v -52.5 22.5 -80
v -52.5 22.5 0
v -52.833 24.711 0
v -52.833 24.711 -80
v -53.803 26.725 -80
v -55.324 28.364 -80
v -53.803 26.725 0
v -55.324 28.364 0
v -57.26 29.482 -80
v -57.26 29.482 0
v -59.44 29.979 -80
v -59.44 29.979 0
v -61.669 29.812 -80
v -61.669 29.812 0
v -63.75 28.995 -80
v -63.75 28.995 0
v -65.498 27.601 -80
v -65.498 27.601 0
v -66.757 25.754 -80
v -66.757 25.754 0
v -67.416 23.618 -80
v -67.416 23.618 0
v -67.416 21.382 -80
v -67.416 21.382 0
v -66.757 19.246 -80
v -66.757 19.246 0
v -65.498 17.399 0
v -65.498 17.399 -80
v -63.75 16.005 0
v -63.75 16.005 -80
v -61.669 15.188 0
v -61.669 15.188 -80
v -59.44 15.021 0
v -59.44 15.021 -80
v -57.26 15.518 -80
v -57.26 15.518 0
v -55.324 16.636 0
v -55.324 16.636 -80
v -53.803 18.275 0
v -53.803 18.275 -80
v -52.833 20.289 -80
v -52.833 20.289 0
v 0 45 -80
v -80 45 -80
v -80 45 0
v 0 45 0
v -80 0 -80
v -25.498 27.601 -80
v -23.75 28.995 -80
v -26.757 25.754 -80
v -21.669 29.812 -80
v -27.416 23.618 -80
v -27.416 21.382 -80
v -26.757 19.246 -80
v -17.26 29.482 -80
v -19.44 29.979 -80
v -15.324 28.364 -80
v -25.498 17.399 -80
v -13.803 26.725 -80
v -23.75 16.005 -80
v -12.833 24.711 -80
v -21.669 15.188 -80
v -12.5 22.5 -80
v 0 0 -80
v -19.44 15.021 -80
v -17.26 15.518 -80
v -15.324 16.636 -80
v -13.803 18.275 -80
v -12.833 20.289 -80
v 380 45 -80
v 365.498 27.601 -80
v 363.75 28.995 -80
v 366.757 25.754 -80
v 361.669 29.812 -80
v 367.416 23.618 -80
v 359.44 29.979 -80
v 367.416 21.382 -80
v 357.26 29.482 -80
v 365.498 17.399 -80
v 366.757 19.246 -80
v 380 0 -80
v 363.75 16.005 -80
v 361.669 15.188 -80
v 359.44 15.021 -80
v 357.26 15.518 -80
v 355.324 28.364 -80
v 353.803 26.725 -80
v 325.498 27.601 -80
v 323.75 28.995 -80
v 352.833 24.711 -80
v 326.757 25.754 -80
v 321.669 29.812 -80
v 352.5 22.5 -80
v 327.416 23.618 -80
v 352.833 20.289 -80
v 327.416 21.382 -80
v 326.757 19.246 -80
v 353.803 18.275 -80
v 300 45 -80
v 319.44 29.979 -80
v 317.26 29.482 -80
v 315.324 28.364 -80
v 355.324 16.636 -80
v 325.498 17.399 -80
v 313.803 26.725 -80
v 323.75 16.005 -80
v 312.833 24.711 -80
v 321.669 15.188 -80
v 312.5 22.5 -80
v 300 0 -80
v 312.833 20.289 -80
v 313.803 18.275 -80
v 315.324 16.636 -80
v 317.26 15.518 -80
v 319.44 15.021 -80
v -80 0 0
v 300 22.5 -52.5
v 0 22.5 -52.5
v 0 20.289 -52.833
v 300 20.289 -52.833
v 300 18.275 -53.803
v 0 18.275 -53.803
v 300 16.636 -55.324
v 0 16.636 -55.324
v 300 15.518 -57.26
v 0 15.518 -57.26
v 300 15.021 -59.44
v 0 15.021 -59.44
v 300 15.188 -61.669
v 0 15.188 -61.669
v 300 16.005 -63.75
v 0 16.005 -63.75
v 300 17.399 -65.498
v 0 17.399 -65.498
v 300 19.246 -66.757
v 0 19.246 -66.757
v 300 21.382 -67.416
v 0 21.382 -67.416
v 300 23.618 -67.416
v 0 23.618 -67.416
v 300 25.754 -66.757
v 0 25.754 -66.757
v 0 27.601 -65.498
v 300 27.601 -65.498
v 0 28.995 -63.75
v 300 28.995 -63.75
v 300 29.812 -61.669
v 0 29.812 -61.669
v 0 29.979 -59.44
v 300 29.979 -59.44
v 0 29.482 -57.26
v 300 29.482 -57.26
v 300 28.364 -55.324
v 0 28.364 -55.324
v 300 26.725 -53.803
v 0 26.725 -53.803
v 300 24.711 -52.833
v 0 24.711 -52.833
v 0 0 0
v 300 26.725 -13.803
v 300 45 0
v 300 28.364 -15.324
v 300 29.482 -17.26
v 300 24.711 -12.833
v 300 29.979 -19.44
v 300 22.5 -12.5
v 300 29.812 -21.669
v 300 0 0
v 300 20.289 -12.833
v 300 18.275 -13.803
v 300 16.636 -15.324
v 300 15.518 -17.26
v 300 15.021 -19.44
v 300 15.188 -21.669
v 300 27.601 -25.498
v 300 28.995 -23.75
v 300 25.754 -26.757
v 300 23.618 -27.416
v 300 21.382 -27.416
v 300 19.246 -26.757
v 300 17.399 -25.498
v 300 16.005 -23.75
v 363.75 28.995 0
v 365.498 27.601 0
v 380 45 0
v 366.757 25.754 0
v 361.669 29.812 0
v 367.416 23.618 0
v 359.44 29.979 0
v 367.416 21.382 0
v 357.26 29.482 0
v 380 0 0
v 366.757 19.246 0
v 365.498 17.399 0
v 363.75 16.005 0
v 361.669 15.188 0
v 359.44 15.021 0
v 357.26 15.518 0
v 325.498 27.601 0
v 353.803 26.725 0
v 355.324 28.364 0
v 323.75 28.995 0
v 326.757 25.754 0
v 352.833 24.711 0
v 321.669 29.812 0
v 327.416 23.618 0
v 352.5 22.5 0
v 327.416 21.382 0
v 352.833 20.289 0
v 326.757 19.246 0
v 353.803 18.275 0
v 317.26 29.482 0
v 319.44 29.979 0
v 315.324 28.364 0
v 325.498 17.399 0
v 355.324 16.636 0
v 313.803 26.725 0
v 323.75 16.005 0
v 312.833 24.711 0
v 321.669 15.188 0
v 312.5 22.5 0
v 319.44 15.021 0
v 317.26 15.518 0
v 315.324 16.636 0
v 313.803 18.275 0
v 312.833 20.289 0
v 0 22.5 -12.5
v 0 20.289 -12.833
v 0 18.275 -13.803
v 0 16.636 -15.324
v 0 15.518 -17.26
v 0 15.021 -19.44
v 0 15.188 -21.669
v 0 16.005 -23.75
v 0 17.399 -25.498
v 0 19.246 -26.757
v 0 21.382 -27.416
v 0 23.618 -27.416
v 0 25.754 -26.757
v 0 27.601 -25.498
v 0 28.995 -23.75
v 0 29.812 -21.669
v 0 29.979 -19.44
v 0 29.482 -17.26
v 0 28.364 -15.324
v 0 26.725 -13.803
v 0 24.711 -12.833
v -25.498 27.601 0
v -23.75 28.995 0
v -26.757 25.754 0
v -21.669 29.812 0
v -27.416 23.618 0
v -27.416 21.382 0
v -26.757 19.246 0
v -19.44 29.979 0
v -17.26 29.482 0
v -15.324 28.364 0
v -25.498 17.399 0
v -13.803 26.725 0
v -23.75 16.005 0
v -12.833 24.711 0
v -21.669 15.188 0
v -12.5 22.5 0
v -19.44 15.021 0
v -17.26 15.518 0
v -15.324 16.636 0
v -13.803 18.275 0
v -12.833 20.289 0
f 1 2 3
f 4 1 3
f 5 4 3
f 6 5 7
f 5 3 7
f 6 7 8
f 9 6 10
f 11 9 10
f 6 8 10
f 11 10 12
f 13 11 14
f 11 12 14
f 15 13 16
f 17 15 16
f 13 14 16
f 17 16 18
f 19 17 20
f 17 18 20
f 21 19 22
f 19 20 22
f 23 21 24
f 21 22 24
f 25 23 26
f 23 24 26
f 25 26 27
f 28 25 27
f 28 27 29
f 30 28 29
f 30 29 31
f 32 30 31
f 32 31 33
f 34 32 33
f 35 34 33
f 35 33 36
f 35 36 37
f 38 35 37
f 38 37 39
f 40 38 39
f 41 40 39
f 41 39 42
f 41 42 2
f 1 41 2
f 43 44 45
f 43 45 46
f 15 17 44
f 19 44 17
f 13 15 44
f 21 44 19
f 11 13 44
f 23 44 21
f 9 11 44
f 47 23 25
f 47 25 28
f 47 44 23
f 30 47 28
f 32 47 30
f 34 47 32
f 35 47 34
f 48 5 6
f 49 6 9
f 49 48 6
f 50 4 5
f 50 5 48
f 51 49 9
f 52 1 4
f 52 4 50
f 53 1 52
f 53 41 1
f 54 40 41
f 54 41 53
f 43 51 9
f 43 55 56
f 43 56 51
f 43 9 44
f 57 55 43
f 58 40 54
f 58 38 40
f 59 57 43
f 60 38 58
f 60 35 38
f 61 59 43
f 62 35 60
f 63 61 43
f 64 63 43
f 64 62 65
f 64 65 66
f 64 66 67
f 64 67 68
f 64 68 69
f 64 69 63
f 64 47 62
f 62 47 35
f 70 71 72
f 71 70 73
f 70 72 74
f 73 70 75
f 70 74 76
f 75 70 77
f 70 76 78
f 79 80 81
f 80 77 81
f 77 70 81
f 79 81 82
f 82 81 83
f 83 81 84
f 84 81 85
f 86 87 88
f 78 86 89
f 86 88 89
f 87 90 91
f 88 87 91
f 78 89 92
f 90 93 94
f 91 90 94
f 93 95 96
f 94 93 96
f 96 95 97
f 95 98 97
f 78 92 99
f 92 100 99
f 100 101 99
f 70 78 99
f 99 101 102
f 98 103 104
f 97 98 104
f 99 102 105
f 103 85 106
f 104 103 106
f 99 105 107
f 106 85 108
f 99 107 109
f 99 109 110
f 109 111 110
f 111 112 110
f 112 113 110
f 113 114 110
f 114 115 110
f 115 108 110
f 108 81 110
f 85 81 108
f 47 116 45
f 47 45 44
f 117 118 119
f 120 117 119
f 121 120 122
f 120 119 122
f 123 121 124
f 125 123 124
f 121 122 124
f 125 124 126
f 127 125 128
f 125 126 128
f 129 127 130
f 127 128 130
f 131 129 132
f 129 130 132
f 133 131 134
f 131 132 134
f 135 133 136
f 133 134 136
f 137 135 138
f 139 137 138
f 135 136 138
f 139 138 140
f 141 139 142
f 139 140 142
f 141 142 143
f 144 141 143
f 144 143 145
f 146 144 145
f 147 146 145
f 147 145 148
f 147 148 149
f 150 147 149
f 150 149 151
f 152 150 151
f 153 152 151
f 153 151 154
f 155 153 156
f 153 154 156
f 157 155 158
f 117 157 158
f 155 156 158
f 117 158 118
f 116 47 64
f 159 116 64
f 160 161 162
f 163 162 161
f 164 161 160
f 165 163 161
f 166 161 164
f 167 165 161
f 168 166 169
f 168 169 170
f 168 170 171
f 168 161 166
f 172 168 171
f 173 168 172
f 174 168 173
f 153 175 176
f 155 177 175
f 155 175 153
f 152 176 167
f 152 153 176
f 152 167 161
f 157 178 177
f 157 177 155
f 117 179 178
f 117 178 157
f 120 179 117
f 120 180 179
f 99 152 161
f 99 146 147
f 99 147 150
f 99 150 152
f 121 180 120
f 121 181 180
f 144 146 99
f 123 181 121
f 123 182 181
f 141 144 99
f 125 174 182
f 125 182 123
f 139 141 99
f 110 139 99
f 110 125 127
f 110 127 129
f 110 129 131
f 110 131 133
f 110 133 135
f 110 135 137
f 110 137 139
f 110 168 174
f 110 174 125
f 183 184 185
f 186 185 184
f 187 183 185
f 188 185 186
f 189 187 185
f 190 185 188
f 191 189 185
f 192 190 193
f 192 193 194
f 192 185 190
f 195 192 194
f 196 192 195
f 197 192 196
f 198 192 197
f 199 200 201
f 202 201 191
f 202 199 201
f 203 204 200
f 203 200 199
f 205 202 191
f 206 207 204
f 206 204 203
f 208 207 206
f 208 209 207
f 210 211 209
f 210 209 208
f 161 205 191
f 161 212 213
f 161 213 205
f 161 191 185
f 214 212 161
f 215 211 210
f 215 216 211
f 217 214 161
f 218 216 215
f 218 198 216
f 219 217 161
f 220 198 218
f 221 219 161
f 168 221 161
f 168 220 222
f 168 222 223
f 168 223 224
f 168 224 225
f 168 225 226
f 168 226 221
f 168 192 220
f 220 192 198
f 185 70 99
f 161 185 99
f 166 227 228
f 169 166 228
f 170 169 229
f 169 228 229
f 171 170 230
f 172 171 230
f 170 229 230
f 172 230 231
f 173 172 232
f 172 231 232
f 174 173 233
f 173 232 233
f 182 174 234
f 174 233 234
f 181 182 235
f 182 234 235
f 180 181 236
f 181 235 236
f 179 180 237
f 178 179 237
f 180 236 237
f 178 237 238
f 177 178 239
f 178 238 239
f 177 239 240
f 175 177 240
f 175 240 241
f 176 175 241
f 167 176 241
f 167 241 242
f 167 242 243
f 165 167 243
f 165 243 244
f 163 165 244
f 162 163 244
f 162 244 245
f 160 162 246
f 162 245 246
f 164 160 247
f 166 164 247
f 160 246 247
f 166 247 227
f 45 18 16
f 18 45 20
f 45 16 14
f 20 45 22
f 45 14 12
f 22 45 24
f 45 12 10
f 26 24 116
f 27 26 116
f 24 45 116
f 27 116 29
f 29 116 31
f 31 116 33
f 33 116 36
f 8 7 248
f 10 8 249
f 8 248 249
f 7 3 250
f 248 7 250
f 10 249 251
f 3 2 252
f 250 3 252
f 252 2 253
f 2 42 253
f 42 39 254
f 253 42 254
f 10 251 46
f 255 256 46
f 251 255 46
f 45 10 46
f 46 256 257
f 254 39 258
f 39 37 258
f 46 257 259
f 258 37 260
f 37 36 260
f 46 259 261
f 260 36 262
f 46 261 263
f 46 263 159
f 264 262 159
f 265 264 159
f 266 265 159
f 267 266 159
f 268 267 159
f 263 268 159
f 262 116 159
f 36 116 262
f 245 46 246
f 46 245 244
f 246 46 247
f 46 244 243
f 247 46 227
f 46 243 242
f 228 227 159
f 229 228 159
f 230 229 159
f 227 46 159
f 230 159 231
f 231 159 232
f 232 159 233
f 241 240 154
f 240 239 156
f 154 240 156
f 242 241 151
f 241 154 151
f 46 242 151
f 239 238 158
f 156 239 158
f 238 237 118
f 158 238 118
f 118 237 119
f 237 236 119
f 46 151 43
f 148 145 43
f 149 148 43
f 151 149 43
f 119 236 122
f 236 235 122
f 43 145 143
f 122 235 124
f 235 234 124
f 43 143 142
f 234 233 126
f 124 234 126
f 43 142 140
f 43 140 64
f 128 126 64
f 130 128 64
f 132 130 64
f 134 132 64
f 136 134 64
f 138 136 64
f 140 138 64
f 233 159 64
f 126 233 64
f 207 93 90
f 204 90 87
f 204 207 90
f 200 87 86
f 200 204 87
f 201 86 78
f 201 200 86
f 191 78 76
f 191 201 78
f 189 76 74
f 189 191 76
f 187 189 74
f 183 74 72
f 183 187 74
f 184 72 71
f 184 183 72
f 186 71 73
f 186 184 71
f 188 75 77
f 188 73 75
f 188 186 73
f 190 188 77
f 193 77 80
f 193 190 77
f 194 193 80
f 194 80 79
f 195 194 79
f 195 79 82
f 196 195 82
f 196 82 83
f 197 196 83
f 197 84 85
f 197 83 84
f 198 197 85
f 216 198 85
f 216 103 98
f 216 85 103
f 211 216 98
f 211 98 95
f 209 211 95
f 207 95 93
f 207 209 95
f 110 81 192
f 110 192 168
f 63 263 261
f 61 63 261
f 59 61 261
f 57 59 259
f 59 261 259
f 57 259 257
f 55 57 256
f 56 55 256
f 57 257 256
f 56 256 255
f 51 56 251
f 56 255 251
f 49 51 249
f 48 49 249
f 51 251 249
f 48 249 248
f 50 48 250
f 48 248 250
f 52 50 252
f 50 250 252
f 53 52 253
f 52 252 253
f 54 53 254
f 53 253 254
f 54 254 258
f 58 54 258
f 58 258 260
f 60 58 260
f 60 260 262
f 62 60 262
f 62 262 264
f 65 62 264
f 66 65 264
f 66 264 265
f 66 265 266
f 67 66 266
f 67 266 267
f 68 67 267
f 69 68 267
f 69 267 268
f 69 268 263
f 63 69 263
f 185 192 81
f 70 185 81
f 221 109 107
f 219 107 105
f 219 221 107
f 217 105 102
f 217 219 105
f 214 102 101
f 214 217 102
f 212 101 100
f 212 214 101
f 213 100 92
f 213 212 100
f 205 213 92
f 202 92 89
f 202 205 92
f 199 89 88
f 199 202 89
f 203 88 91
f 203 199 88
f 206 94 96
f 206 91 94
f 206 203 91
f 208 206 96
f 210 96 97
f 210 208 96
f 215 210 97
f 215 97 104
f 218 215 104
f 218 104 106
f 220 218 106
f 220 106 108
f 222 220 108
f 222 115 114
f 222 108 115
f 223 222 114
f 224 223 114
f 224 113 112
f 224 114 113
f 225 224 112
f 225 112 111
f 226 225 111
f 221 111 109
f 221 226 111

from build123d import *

# Parameters (mm, degrees)
SKETCH1_W           = 80
SKETCH1_H           = 80
BOSS_EXTRUDE1_DEPTH = 45
SKETCH2_R           = 7.5
CUT_EXTRUDE1_DEPTH  = 122.757956619
SKETCH3_R           = 7.5
BOSS_EXTRUDE2_DEPTH = 300


with BuildPart() as part:
    # Sketch1 → Boss-Extrude1 (new body)
    with BuildSketch(Plane(origin=(0, 0, 0), x_dir=(1, 0, 0), z_dir=(0, 1, 0))):
        with Locations((-40, 40)):
            Rectangle(SKETCH1_W, SKETCH1_H)
    boss_extrude1 = extrude(amount=BOSS_EXTRUDE1_DEPTH)

    # Sketch2 → Cut-Extrude1 (cut, through all)
    with BuildSketch(Plane.XY):
        with Locations((-60, 22.5)):
            Circle(SKETCH2_R)
        with Locations((-20, 22.5)):
            Circle(SKETCH2_R)
    cut_extrude1 = extrude(amount=-CUT_EXTRUDE1_DEPTH, mode=Mode.SUBTRACT)

    # Sketch3 → Boss-Extrude2 (add)
    with BuildSketch(Plane(origin=(0, 0, 0), x_dir=(0, 0, -1), z_dir=(1, 0, 0))):
        with Locations(Location((20, 22.5, 0), (0, 0, 180))):
            Circle(SKETCH3_R)
        with Locations(Location((60, 22.5, 0), (0, 0, 180))):
            Circle(SKETCH3_R)
    extrude(amount=BOSS_EXTRUDE2_DEPTH)

    # Mirror3: Boss-Extrude1, Cut-Extrude1 across plane
    add(boss_extrude1.mirror(Plane(origin=(150, 0, 0), x_dir=(0, 0, 1), z_dir=(1, 0, 0))))
    add(cut_extrude1.mirror(Plane(origin=(150, 0, 0), x_dir=(0, 0, 1), z_dir=(1, 0, 0))), mode=Mode.SUBTRACT)


solid = part.part
